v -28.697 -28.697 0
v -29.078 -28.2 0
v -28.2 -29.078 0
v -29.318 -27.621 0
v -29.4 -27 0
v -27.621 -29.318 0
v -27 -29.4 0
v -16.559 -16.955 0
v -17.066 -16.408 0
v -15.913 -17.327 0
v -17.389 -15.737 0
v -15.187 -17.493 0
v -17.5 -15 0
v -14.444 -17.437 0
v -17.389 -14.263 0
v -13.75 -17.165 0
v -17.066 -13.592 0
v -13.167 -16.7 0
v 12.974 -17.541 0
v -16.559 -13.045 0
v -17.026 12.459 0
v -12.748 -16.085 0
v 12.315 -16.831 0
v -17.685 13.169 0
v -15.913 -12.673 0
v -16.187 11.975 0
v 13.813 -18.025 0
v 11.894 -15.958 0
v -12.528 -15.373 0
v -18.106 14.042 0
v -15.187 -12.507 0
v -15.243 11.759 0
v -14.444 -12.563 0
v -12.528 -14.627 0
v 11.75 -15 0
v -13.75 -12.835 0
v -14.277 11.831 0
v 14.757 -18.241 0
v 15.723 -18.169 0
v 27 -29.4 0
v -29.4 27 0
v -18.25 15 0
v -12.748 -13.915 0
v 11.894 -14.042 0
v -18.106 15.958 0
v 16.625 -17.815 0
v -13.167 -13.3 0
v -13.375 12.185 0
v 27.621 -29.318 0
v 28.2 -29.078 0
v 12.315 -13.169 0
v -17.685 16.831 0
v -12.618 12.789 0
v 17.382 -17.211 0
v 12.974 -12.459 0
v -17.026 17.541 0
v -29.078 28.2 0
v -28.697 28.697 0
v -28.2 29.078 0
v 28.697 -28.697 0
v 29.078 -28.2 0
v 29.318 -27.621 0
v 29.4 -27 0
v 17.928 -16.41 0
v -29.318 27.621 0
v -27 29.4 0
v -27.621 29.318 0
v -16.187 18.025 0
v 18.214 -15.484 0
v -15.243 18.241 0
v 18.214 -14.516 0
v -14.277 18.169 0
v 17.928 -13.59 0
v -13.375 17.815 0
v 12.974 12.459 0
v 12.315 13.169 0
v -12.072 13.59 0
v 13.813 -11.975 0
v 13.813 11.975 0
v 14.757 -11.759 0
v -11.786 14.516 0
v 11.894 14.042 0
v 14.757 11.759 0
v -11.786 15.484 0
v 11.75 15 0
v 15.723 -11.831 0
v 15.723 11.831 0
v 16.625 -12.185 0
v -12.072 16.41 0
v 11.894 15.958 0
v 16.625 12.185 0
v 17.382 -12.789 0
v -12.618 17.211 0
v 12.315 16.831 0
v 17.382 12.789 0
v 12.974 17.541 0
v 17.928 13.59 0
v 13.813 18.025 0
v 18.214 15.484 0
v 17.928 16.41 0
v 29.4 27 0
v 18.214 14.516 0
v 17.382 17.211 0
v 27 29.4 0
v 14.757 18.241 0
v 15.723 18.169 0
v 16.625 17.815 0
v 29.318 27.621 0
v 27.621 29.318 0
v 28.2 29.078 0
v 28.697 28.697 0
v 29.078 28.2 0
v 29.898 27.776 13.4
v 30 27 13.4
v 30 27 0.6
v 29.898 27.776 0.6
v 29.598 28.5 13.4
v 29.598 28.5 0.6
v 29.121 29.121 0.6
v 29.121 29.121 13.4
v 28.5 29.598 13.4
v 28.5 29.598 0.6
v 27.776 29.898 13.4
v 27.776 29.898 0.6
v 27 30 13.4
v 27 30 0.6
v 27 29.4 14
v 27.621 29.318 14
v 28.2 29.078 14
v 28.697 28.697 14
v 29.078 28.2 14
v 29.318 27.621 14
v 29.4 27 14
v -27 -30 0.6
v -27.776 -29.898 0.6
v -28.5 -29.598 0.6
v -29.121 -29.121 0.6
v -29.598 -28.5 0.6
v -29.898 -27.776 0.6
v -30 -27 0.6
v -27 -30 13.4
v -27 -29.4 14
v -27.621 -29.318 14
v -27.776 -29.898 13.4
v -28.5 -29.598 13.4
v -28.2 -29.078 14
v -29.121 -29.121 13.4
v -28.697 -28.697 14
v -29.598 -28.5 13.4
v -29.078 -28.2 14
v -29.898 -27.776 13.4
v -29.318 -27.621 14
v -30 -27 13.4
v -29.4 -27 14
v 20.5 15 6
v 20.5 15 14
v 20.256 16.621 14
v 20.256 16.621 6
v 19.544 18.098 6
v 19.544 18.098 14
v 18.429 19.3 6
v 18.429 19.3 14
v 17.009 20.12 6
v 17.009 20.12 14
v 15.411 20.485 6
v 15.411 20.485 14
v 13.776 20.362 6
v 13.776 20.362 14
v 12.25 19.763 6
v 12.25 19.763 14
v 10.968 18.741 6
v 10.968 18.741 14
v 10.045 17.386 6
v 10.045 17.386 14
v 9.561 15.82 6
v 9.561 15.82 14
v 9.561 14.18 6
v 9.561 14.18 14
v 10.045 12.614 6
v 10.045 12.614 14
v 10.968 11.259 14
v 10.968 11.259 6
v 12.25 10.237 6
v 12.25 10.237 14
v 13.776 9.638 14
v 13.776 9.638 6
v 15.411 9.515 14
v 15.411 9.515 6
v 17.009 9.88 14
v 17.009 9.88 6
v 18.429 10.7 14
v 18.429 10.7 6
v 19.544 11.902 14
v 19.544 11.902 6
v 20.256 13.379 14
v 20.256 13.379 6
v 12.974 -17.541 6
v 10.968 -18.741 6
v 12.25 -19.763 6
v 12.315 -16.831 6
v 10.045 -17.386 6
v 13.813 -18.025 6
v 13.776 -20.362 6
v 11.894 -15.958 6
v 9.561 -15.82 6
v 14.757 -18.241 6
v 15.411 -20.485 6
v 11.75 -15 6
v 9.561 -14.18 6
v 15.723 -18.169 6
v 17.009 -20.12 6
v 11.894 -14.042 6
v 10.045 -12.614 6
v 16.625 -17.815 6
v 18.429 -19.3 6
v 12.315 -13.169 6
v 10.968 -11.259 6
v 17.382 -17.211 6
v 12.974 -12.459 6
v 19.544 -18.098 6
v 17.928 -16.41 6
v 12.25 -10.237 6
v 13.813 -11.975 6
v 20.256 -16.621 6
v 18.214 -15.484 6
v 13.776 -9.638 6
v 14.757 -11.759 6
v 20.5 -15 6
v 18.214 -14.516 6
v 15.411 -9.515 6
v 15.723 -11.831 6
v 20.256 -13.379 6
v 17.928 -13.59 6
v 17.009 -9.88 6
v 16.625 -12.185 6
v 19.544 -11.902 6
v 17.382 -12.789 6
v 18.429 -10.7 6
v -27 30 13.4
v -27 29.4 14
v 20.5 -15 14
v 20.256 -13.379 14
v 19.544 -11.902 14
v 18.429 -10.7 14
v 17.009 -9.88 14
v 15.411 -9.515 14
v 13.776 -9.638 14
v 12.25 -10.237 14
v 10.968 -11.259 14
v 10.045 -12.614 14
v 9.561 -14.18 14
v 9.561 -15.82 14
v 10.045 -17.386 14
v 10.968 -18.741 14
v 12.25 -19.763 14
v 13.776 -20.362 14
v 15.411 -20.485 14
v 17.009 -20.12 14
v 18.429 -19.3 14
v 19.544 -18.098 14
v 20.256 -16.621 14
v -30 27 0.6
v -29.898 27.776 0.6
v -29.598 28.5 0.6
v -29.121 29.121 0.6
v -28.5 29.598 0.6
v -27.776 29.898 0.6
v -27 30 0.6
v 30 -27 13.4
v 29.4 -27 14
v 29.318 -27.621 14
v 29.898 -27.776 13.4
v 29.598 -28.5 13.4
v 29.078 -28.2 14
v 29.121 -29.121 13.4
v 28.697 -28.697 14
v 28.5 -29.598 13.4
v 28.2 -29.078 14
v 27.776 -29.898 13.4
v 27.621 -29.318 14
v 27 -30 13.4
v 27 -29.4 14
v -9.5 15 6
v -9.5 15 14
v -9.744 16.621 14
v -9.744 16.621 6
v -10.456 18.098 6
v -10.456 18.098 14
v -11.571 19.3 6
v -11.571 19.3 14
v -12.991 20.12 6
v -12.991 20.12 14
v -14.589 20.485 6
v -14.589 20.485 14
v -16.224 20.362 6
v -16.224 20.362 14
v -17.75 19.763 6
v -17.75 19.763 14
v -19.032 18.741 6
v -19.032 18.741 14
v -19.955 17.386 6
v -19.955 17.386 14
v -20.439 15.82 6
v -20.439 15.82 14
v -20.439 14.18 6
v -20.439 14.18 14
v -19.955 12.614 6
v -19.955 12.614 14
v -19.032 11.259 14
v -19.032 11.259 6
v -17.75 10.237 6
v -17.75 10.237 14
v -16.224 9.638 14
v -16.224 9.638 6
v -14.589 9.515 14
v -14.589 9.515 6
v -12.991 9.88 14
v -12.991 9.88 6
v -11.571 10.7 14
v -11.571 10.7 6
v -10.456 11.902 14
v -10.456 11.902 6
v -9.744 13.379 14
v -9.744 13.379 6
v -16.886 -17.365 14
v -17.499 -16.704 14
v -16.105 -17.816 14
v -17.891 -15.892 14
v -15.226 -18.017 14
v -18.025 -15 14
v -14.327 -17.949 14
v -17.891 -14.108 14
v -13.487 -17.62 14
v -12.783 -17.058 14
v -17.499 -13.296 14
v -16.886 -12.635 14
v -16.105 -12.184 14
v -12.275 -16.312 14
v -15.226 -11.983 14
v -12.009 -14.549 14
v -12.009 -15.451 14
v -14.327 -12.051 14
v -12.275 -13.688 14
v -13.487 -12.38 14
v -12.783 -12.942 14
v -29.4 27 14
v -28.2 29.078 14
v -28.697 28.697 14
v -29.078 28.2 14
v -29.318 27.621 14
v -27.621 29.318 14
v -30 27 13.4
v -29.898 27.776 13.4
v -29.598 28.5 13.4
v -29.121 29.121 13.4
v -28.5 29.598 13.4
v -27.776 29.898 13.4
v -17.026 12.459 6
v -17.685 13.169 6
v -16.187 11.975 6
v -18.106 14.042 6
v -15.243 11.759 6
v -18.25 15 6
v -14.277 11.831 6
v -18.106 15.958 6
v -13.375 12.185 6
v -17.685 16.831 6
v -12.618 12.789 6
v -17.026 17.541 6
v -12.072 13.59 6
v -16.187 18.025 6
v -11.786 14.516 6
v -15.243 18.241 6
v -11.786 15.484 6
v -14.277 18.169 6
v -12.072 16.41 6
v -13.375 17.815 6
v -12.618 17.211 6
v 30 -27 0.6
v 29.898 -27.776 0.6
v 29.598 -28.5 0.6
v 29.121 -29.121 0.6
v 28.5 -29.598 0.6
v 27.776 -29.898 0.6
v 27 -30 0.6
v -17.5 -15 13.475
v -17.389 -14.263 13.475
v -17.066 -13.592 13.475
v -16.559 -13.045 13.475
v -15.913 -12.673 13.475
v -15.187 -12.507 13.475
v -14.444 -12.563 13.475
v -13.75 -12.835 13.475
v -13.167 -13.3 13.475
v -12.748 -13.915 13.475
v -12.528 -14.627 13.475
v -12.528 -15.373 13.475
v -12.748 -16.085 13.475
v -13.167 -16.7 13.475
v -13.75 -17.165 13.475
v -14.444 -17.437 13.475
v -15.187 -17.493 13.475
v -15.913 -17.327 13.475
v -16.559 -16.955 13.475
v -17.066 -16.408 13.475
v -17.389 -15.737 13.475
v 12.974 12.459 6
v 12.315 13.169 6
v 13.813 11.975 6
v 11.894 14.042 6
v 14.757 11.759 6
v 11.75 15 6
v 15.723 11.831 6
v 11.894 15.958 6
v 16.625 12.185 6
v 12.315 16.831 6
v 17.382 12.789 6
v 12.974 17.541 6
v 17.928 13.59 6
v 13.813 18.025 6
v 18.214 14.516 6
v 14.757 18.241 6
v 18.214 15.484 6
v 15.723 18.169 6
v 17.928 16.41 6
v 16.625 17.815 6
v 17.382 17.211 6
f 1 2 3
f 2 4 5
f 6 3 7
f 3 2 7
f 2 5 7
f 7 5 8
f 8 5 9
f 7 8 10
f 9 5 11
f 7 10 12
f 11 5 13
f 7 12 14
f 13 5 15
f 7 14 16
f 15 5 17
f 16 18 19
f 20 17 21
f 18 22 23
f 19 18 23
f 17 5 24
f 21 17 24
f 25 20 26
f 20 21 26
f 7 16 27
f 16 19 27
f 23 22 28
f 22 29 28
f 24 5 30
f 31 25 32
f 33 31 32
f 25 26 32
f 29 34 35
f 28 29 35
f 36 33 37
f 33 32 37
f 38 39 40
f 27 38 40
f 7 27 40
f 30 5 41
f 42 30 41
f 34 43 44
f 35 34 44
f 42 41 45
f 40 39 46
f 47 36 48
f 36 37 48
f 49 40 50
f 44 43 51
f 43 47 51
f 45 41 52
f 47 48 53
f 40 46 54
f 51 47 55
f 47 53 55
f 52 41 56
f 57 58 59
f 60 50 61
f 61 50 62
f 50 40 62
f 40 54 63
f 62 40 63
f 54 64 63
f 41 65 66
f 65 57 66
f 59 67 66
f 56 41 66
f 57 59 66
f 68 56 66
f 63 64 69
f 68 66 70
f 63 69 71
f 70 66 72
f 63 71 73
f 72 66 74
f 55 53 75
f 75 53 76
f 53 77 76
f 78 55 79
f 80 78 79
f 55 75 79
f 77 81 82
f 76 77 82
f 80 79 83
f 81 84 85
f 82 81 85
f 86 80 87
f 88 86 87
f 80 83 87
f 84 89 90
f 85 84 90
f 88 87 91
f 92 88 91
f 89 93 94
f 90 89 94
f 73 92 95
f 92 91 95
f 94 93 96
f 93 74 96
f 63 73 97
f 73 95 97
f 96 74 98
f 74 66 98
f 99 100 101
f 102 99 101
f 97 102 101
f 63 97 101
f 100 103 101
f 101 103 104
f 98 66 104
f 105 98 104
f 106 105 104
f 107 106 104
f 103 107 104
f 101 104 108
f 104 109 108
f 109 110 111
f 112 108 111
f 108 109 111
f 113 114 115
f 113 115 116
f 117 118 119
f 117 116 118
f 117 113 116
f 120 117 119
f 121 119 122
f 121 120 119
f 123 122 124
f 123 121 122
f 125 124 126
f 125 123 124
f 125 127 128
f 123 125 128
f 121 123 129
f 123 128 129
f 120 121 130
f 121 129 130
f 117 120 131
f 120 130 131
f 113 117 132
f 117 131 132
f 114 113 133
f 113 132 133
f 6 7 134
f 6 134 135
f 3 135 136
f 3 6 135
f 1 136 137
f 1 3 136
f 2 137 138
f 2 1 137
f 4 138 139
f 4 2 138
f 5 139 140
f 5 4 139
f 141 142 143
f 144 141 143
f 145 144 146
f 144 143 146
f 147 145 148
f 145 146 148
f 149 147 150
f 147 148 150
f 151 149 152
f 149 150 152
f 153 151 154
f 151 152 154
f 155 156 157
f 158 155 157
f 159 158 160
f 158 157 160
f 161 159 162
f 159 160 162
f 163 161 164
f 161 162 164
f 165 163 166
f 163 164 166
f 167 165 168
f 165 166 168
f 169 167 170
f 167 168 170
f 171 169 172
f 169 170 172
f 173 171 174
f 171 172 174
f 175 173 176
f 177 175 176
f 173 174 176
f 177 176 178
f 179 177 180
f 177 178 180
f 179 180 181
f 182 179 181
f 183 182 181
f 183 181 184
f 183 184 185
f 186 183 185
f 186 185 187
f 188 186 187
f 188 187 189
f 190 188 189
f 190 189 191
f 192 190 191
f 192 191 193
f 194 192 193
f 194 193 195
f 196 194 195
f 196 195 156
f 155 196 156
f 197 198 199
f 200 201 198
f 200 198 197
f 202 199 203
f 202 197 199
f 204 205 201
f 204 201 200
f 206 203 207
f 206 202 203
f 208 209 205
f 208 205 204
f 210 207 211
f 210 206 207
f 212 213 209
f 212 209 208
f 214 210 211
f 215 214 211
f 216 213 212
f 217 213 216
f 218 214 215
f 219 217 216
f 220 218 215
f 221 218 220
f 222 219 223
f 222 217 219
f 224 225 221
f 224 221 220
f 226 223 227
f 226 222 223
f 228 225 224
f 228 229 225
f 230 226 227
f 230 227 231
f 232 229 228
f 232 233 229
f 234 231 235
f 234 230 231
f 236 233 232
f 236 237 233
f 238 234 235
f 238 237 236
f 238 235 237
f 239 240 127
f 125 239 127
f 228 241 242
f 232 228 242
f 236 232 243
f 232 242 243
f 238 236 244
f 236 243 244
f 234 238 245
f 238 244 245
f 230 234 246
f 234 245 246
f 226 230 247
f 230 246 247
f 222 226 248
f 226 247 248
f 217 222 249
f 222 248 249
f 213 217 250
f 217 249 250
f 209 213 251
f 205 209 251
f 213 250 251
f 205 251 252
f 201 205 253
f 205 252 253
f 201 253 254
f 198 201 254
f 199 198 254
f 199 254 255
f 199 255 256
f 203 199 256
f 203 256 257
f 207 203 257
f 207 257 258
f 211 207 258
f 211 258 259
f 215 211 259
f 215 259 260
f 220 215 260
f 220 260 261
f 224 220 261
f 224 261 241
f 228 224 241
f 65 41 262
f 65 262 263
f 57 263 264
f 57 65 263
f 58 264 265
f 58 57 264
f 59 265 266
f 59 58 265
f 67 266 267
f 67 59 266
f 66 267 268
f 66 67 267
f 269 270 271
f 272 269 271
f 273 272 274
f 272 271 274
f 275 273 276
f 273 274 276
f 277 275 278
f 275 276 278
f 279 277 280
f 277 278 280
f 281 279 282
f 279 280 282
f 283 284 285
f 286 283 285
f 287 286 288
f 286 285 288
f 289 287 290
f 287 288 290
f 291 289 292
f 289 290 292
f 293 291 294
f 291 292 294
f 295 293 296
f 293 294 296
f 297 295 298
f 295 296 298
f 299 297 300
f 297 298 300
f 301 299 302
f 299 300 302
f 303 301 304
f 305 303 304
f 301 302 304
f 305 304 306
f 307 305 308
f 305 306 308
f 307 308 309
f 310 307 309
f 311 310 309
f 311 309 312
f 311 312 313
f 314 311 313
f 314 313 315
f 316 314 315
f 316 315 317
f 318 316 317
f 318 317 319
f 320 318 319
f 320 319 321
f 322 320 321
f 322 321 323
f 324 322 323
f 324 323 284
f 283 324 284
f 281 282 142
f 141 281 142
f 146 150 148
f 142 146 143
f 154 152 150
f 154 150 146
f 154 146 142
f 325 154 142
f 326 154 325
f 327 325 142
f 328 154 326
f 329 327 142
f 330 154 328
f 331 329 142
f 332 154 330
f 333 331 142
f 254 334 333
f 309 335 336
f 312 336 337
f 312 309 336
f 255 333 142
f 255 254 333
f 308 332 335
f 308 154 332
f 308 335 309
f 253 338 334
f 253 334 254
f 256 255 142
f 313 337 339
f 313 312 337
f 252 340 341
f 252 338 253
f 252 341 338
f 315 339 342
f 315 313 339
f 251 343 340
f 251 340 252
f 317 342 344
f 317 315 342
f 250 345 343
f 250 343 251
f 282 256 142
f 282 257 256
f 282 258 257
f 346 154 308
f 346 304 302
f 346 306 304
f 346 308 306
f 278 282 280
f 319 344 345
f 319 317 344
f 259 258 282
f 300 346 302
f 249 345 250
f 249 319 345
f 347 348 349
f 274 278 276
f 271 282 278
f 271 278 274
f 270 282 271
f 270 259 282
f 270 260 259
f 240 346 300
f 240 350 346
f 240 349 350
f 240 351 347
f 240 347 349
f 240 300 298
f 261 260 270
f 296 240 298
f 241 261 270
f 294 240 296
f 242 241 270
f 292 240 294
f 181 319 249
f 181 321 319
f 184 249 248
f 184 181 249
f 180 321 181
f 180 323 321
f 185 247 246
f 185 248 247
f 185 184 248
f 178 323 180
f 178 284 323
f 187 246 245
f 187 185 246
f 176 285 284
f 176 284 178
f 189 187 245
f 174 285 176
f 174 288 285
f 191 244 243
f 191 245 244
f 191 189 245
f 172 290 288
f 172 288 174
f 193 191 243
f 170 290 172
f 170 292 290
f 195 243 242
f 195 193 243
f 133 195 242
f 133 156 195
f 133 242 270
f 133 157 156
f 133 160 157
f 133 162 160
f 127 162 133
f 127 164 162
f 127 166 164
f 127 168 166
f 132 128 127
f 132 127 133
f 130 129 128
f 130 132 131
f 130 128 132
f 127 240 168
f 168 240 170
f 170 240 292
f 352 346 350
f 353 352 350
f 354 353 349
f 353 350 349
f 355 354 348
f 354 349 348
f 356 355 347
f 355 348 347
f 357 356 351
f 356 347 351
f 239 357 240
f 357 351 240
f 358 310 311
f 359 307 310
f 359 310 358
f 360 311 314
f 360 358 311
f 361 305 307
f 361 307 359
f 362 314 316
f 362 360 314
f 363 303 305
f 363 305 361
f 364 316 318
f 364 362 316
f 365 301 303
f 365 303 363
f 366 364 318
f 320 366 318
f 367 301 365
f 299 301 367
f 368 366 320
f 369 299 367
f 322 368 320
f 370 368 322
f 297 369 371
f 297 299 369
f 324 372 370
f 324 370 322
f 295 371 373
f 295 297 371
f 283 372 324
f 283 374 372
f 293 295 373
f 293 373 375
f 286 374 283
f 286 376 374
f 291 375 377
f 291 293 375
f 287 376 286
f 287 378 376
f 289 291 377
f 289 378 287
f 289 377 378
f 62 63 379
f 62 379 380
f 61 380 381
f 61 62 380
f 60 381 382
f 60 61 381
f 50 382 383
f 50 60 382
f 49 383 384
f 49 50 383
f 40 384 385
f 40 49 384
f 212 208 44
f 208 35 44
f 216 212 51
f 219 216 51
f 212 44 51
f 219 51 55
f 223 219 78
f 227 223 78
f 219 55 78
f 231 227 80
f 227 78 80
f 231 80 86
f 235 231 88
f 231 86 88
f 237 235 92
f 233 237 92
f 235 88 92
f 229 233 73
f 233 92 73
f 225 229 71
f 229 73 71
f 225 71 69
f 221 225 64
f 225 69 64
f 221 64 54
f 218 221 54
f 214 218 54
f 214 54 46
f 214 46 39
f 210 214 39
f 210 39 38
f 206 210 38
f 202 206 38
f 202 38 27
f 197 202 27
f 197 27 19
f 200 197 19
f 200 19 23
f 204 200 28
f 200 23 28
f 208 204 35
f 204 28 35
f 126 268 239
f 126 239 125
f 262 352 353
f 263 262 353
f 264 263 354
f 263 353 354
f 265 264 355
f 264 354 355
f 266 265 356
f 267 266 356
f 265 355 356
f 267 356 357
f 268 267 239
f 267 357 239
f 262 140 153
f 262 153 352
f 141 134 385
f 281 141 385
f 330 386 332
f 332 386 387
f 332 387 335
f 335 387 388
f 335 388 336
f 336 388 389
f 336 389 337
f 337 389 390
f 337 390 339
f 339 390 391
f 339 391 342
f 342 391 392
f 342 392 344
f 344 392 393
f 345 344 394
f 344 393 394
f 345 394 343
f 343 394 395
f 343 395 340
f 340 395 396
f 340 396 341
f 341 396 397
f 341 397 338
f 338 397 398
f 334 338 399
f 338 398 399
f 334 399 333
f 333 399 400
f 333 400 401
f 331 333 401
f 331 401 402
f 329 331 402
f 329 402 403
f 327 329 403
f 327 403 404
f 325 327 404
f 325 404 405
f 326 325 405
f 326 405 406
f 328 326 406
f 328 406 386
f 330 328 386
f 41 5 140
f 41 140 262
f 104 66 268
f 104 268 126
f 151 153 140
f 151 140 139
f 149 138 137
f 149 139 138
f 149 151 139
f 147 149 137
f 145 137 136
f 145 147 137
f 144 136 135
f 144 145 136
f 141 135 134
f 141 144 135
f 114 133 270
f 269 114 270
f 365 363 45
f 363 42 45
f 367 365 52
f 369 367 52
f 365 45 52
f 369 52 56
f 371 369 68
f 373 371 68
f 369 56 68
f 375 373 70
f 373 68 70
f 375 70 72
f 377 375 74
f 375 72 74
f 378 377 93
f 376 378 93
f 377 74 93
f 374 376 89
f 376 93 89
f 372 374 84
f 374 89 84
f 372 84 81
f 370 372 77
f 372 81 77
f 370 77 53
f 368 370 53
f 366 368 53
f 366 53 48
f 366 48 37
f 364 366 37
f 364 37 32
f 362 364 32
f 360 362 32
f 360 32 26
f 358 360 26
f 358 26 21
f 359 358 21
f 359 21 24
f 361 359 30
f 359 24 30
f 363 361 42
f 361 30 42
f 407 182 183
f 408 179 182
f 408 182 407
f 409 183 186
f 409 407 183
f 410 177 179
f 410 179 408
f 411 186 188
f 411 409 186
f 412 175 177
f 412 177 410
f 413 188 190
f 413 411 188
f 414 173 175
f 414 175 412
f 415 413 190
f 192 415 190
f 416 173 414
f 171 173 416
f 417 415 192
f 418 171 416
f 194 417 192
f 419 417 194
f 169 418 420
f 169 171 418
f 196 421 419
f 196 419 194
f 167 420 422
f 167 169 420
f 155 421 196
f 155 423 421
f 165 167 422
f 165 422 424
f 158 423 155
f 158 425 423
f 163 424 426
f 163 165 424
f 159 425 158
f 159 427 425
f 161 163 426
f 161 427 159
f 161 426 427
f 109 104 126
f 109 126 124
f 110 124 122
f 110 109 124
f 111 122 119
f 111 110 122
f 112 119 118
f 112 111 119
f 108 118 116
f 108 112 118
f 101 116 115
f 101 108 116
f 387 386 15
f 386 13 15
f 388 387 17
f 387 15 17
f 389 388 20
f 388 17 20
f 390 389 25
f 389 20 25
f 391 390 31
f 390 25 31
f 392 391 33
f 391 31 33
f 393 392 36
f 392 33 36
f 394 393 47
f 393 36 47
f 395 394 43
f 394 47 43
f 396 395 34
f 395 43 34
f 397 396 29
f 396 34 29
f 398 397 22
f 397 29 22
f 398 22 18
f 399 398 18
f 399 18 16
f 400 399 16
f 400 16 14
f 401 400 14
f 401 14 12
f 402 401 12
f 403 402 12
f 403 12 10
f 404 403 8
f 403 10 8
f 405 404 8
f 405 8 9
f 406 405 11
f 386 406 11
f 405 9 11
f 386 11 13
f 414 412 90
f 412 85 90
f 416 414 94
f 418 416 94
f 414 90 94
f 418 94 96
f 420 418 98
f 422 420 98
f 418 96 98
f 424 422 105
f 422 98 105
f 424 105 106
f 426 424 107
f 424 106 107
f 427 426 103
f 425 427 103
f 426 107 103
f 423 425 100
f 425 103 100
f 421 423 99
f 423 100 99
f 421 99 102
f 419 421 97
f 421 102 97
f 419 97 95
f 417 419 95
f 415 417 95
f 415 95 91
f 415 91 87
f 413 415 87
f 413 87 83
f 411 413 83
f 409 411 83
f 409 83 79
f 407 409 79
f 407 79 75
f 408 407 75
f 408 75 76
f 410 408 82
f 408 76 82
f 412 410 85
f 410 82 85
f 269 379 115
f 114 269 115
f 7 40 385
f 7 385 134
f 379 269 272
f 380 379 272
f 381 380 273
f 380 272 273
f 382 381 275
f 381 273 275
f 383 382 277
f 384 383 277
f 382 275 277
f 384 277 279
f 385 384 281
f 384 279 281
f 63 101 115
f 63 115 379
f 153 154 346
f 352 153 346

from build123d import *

# Parameters (mm, degrees)
SKETCH1_W                                           = 60
SKETCH1_H                                           = 60
BOSS_EXTRUDE1_DEPTH                                 = 14
CBORE_FOR_M6_HEX_SOCKET_HEAD_CAP_SCREW1_D           = 6.5
CBORE_FOR_M6_HEX_SOCKET_HEAD_CAP_SCREW1_CBORE_D     = 11
CBORE_FOR_M6_HEX_SOCKET_HEAD_CAP_SCREW1_CBORE_DEPTH = 8
M6_TAPPED_HOLE1_D                                   = 5
M6_TAPPED_HOLE1_CSINK_D                             = 6.05
M6_TAPPED_HOLE1_CSINK_ANGLE                         = 90
FILLET1_R                                           = 3
CHAMFER1_SIZE                                       = 0.6


with BuildPart() as part:
    # Sketch1 → Boss-Extrude1 (new body)
    with BuildSketch(Plane.XY):
        Rectangle(SKETCH1_W, SKETCH1_H)
    extrude(amount=BOSS_EXTRUDE1_DEPTH)

    # CBORE for M6 Hex Socket Head Cap Screw1 (through all)
    with Locations(Plane.XY.offset(14)):
        with Locations((-15, 15), (15, 15), (15, -15)):
            CounterBoreHole(CBORE_FOR_M6_HEX_SOCKET_HEAD_CAP_SCREW1_D / 2, CBORE_FOR_M6_HEX_SOCKET_HEAD_CAP_SCREW1_CBORE_D / 2, CBORE_FOR_M6_HEX_SOCKET_HEAD_CAP_SCREW1_CBORE_DEPTH)

    # M6 Tapped Hole1 (through all)
    with Locations(Plane.XY.offset(14)):
        with Locations((-15, -15)):
            CounterSinkHole(M6_TAPPED_HOLE1_D / 2, M6_TAPPED_HOLE1_CSINK_D / 2, counter_sink_angle=M6_TAPPED_HOLE1_CSINK_ANGLE)

    # Fillet1
    fillet1_edges = [part.edges().sort_by_distance(p)[0] for p in [
        (-30, 30, 7),
        (30, 30, 7),
        (30, -30, 7),
        (-30, -30, 7),
    ]]
    fillet(fillet1_edges, radius=FILLET1_R)

    # Chamfer1
    chamfer1_edges = [part.edges().sort_by_distance(p)[0] for p in [
        (-30, 0, 0),
        (-30, 0, 14),
        (0, 30, 0),
        (30, 0, 0),
        (0, -30, 0),
        (-29.121320344, -29.121320344, 0),
        (29.121320344, -29.121320344, 0),
        (29.121320344, 29.121320344, 0),
        (-29.121320344, 29.121320344, 0),
        (0, 30, 14),
        (0, -30, 14),
        (30, 0, 14),
        (-29.121320344, -29.121320344, 14),
        (29.121320344, -29.121320344, 14),
        (29.121320344, 29.121320344, 14),
        (-29.121320344, 29.121320344, 14),
    ]]
    chamfer(chamfer1_edges, length=CHAMFER1_SIZE)


solid = part.part
